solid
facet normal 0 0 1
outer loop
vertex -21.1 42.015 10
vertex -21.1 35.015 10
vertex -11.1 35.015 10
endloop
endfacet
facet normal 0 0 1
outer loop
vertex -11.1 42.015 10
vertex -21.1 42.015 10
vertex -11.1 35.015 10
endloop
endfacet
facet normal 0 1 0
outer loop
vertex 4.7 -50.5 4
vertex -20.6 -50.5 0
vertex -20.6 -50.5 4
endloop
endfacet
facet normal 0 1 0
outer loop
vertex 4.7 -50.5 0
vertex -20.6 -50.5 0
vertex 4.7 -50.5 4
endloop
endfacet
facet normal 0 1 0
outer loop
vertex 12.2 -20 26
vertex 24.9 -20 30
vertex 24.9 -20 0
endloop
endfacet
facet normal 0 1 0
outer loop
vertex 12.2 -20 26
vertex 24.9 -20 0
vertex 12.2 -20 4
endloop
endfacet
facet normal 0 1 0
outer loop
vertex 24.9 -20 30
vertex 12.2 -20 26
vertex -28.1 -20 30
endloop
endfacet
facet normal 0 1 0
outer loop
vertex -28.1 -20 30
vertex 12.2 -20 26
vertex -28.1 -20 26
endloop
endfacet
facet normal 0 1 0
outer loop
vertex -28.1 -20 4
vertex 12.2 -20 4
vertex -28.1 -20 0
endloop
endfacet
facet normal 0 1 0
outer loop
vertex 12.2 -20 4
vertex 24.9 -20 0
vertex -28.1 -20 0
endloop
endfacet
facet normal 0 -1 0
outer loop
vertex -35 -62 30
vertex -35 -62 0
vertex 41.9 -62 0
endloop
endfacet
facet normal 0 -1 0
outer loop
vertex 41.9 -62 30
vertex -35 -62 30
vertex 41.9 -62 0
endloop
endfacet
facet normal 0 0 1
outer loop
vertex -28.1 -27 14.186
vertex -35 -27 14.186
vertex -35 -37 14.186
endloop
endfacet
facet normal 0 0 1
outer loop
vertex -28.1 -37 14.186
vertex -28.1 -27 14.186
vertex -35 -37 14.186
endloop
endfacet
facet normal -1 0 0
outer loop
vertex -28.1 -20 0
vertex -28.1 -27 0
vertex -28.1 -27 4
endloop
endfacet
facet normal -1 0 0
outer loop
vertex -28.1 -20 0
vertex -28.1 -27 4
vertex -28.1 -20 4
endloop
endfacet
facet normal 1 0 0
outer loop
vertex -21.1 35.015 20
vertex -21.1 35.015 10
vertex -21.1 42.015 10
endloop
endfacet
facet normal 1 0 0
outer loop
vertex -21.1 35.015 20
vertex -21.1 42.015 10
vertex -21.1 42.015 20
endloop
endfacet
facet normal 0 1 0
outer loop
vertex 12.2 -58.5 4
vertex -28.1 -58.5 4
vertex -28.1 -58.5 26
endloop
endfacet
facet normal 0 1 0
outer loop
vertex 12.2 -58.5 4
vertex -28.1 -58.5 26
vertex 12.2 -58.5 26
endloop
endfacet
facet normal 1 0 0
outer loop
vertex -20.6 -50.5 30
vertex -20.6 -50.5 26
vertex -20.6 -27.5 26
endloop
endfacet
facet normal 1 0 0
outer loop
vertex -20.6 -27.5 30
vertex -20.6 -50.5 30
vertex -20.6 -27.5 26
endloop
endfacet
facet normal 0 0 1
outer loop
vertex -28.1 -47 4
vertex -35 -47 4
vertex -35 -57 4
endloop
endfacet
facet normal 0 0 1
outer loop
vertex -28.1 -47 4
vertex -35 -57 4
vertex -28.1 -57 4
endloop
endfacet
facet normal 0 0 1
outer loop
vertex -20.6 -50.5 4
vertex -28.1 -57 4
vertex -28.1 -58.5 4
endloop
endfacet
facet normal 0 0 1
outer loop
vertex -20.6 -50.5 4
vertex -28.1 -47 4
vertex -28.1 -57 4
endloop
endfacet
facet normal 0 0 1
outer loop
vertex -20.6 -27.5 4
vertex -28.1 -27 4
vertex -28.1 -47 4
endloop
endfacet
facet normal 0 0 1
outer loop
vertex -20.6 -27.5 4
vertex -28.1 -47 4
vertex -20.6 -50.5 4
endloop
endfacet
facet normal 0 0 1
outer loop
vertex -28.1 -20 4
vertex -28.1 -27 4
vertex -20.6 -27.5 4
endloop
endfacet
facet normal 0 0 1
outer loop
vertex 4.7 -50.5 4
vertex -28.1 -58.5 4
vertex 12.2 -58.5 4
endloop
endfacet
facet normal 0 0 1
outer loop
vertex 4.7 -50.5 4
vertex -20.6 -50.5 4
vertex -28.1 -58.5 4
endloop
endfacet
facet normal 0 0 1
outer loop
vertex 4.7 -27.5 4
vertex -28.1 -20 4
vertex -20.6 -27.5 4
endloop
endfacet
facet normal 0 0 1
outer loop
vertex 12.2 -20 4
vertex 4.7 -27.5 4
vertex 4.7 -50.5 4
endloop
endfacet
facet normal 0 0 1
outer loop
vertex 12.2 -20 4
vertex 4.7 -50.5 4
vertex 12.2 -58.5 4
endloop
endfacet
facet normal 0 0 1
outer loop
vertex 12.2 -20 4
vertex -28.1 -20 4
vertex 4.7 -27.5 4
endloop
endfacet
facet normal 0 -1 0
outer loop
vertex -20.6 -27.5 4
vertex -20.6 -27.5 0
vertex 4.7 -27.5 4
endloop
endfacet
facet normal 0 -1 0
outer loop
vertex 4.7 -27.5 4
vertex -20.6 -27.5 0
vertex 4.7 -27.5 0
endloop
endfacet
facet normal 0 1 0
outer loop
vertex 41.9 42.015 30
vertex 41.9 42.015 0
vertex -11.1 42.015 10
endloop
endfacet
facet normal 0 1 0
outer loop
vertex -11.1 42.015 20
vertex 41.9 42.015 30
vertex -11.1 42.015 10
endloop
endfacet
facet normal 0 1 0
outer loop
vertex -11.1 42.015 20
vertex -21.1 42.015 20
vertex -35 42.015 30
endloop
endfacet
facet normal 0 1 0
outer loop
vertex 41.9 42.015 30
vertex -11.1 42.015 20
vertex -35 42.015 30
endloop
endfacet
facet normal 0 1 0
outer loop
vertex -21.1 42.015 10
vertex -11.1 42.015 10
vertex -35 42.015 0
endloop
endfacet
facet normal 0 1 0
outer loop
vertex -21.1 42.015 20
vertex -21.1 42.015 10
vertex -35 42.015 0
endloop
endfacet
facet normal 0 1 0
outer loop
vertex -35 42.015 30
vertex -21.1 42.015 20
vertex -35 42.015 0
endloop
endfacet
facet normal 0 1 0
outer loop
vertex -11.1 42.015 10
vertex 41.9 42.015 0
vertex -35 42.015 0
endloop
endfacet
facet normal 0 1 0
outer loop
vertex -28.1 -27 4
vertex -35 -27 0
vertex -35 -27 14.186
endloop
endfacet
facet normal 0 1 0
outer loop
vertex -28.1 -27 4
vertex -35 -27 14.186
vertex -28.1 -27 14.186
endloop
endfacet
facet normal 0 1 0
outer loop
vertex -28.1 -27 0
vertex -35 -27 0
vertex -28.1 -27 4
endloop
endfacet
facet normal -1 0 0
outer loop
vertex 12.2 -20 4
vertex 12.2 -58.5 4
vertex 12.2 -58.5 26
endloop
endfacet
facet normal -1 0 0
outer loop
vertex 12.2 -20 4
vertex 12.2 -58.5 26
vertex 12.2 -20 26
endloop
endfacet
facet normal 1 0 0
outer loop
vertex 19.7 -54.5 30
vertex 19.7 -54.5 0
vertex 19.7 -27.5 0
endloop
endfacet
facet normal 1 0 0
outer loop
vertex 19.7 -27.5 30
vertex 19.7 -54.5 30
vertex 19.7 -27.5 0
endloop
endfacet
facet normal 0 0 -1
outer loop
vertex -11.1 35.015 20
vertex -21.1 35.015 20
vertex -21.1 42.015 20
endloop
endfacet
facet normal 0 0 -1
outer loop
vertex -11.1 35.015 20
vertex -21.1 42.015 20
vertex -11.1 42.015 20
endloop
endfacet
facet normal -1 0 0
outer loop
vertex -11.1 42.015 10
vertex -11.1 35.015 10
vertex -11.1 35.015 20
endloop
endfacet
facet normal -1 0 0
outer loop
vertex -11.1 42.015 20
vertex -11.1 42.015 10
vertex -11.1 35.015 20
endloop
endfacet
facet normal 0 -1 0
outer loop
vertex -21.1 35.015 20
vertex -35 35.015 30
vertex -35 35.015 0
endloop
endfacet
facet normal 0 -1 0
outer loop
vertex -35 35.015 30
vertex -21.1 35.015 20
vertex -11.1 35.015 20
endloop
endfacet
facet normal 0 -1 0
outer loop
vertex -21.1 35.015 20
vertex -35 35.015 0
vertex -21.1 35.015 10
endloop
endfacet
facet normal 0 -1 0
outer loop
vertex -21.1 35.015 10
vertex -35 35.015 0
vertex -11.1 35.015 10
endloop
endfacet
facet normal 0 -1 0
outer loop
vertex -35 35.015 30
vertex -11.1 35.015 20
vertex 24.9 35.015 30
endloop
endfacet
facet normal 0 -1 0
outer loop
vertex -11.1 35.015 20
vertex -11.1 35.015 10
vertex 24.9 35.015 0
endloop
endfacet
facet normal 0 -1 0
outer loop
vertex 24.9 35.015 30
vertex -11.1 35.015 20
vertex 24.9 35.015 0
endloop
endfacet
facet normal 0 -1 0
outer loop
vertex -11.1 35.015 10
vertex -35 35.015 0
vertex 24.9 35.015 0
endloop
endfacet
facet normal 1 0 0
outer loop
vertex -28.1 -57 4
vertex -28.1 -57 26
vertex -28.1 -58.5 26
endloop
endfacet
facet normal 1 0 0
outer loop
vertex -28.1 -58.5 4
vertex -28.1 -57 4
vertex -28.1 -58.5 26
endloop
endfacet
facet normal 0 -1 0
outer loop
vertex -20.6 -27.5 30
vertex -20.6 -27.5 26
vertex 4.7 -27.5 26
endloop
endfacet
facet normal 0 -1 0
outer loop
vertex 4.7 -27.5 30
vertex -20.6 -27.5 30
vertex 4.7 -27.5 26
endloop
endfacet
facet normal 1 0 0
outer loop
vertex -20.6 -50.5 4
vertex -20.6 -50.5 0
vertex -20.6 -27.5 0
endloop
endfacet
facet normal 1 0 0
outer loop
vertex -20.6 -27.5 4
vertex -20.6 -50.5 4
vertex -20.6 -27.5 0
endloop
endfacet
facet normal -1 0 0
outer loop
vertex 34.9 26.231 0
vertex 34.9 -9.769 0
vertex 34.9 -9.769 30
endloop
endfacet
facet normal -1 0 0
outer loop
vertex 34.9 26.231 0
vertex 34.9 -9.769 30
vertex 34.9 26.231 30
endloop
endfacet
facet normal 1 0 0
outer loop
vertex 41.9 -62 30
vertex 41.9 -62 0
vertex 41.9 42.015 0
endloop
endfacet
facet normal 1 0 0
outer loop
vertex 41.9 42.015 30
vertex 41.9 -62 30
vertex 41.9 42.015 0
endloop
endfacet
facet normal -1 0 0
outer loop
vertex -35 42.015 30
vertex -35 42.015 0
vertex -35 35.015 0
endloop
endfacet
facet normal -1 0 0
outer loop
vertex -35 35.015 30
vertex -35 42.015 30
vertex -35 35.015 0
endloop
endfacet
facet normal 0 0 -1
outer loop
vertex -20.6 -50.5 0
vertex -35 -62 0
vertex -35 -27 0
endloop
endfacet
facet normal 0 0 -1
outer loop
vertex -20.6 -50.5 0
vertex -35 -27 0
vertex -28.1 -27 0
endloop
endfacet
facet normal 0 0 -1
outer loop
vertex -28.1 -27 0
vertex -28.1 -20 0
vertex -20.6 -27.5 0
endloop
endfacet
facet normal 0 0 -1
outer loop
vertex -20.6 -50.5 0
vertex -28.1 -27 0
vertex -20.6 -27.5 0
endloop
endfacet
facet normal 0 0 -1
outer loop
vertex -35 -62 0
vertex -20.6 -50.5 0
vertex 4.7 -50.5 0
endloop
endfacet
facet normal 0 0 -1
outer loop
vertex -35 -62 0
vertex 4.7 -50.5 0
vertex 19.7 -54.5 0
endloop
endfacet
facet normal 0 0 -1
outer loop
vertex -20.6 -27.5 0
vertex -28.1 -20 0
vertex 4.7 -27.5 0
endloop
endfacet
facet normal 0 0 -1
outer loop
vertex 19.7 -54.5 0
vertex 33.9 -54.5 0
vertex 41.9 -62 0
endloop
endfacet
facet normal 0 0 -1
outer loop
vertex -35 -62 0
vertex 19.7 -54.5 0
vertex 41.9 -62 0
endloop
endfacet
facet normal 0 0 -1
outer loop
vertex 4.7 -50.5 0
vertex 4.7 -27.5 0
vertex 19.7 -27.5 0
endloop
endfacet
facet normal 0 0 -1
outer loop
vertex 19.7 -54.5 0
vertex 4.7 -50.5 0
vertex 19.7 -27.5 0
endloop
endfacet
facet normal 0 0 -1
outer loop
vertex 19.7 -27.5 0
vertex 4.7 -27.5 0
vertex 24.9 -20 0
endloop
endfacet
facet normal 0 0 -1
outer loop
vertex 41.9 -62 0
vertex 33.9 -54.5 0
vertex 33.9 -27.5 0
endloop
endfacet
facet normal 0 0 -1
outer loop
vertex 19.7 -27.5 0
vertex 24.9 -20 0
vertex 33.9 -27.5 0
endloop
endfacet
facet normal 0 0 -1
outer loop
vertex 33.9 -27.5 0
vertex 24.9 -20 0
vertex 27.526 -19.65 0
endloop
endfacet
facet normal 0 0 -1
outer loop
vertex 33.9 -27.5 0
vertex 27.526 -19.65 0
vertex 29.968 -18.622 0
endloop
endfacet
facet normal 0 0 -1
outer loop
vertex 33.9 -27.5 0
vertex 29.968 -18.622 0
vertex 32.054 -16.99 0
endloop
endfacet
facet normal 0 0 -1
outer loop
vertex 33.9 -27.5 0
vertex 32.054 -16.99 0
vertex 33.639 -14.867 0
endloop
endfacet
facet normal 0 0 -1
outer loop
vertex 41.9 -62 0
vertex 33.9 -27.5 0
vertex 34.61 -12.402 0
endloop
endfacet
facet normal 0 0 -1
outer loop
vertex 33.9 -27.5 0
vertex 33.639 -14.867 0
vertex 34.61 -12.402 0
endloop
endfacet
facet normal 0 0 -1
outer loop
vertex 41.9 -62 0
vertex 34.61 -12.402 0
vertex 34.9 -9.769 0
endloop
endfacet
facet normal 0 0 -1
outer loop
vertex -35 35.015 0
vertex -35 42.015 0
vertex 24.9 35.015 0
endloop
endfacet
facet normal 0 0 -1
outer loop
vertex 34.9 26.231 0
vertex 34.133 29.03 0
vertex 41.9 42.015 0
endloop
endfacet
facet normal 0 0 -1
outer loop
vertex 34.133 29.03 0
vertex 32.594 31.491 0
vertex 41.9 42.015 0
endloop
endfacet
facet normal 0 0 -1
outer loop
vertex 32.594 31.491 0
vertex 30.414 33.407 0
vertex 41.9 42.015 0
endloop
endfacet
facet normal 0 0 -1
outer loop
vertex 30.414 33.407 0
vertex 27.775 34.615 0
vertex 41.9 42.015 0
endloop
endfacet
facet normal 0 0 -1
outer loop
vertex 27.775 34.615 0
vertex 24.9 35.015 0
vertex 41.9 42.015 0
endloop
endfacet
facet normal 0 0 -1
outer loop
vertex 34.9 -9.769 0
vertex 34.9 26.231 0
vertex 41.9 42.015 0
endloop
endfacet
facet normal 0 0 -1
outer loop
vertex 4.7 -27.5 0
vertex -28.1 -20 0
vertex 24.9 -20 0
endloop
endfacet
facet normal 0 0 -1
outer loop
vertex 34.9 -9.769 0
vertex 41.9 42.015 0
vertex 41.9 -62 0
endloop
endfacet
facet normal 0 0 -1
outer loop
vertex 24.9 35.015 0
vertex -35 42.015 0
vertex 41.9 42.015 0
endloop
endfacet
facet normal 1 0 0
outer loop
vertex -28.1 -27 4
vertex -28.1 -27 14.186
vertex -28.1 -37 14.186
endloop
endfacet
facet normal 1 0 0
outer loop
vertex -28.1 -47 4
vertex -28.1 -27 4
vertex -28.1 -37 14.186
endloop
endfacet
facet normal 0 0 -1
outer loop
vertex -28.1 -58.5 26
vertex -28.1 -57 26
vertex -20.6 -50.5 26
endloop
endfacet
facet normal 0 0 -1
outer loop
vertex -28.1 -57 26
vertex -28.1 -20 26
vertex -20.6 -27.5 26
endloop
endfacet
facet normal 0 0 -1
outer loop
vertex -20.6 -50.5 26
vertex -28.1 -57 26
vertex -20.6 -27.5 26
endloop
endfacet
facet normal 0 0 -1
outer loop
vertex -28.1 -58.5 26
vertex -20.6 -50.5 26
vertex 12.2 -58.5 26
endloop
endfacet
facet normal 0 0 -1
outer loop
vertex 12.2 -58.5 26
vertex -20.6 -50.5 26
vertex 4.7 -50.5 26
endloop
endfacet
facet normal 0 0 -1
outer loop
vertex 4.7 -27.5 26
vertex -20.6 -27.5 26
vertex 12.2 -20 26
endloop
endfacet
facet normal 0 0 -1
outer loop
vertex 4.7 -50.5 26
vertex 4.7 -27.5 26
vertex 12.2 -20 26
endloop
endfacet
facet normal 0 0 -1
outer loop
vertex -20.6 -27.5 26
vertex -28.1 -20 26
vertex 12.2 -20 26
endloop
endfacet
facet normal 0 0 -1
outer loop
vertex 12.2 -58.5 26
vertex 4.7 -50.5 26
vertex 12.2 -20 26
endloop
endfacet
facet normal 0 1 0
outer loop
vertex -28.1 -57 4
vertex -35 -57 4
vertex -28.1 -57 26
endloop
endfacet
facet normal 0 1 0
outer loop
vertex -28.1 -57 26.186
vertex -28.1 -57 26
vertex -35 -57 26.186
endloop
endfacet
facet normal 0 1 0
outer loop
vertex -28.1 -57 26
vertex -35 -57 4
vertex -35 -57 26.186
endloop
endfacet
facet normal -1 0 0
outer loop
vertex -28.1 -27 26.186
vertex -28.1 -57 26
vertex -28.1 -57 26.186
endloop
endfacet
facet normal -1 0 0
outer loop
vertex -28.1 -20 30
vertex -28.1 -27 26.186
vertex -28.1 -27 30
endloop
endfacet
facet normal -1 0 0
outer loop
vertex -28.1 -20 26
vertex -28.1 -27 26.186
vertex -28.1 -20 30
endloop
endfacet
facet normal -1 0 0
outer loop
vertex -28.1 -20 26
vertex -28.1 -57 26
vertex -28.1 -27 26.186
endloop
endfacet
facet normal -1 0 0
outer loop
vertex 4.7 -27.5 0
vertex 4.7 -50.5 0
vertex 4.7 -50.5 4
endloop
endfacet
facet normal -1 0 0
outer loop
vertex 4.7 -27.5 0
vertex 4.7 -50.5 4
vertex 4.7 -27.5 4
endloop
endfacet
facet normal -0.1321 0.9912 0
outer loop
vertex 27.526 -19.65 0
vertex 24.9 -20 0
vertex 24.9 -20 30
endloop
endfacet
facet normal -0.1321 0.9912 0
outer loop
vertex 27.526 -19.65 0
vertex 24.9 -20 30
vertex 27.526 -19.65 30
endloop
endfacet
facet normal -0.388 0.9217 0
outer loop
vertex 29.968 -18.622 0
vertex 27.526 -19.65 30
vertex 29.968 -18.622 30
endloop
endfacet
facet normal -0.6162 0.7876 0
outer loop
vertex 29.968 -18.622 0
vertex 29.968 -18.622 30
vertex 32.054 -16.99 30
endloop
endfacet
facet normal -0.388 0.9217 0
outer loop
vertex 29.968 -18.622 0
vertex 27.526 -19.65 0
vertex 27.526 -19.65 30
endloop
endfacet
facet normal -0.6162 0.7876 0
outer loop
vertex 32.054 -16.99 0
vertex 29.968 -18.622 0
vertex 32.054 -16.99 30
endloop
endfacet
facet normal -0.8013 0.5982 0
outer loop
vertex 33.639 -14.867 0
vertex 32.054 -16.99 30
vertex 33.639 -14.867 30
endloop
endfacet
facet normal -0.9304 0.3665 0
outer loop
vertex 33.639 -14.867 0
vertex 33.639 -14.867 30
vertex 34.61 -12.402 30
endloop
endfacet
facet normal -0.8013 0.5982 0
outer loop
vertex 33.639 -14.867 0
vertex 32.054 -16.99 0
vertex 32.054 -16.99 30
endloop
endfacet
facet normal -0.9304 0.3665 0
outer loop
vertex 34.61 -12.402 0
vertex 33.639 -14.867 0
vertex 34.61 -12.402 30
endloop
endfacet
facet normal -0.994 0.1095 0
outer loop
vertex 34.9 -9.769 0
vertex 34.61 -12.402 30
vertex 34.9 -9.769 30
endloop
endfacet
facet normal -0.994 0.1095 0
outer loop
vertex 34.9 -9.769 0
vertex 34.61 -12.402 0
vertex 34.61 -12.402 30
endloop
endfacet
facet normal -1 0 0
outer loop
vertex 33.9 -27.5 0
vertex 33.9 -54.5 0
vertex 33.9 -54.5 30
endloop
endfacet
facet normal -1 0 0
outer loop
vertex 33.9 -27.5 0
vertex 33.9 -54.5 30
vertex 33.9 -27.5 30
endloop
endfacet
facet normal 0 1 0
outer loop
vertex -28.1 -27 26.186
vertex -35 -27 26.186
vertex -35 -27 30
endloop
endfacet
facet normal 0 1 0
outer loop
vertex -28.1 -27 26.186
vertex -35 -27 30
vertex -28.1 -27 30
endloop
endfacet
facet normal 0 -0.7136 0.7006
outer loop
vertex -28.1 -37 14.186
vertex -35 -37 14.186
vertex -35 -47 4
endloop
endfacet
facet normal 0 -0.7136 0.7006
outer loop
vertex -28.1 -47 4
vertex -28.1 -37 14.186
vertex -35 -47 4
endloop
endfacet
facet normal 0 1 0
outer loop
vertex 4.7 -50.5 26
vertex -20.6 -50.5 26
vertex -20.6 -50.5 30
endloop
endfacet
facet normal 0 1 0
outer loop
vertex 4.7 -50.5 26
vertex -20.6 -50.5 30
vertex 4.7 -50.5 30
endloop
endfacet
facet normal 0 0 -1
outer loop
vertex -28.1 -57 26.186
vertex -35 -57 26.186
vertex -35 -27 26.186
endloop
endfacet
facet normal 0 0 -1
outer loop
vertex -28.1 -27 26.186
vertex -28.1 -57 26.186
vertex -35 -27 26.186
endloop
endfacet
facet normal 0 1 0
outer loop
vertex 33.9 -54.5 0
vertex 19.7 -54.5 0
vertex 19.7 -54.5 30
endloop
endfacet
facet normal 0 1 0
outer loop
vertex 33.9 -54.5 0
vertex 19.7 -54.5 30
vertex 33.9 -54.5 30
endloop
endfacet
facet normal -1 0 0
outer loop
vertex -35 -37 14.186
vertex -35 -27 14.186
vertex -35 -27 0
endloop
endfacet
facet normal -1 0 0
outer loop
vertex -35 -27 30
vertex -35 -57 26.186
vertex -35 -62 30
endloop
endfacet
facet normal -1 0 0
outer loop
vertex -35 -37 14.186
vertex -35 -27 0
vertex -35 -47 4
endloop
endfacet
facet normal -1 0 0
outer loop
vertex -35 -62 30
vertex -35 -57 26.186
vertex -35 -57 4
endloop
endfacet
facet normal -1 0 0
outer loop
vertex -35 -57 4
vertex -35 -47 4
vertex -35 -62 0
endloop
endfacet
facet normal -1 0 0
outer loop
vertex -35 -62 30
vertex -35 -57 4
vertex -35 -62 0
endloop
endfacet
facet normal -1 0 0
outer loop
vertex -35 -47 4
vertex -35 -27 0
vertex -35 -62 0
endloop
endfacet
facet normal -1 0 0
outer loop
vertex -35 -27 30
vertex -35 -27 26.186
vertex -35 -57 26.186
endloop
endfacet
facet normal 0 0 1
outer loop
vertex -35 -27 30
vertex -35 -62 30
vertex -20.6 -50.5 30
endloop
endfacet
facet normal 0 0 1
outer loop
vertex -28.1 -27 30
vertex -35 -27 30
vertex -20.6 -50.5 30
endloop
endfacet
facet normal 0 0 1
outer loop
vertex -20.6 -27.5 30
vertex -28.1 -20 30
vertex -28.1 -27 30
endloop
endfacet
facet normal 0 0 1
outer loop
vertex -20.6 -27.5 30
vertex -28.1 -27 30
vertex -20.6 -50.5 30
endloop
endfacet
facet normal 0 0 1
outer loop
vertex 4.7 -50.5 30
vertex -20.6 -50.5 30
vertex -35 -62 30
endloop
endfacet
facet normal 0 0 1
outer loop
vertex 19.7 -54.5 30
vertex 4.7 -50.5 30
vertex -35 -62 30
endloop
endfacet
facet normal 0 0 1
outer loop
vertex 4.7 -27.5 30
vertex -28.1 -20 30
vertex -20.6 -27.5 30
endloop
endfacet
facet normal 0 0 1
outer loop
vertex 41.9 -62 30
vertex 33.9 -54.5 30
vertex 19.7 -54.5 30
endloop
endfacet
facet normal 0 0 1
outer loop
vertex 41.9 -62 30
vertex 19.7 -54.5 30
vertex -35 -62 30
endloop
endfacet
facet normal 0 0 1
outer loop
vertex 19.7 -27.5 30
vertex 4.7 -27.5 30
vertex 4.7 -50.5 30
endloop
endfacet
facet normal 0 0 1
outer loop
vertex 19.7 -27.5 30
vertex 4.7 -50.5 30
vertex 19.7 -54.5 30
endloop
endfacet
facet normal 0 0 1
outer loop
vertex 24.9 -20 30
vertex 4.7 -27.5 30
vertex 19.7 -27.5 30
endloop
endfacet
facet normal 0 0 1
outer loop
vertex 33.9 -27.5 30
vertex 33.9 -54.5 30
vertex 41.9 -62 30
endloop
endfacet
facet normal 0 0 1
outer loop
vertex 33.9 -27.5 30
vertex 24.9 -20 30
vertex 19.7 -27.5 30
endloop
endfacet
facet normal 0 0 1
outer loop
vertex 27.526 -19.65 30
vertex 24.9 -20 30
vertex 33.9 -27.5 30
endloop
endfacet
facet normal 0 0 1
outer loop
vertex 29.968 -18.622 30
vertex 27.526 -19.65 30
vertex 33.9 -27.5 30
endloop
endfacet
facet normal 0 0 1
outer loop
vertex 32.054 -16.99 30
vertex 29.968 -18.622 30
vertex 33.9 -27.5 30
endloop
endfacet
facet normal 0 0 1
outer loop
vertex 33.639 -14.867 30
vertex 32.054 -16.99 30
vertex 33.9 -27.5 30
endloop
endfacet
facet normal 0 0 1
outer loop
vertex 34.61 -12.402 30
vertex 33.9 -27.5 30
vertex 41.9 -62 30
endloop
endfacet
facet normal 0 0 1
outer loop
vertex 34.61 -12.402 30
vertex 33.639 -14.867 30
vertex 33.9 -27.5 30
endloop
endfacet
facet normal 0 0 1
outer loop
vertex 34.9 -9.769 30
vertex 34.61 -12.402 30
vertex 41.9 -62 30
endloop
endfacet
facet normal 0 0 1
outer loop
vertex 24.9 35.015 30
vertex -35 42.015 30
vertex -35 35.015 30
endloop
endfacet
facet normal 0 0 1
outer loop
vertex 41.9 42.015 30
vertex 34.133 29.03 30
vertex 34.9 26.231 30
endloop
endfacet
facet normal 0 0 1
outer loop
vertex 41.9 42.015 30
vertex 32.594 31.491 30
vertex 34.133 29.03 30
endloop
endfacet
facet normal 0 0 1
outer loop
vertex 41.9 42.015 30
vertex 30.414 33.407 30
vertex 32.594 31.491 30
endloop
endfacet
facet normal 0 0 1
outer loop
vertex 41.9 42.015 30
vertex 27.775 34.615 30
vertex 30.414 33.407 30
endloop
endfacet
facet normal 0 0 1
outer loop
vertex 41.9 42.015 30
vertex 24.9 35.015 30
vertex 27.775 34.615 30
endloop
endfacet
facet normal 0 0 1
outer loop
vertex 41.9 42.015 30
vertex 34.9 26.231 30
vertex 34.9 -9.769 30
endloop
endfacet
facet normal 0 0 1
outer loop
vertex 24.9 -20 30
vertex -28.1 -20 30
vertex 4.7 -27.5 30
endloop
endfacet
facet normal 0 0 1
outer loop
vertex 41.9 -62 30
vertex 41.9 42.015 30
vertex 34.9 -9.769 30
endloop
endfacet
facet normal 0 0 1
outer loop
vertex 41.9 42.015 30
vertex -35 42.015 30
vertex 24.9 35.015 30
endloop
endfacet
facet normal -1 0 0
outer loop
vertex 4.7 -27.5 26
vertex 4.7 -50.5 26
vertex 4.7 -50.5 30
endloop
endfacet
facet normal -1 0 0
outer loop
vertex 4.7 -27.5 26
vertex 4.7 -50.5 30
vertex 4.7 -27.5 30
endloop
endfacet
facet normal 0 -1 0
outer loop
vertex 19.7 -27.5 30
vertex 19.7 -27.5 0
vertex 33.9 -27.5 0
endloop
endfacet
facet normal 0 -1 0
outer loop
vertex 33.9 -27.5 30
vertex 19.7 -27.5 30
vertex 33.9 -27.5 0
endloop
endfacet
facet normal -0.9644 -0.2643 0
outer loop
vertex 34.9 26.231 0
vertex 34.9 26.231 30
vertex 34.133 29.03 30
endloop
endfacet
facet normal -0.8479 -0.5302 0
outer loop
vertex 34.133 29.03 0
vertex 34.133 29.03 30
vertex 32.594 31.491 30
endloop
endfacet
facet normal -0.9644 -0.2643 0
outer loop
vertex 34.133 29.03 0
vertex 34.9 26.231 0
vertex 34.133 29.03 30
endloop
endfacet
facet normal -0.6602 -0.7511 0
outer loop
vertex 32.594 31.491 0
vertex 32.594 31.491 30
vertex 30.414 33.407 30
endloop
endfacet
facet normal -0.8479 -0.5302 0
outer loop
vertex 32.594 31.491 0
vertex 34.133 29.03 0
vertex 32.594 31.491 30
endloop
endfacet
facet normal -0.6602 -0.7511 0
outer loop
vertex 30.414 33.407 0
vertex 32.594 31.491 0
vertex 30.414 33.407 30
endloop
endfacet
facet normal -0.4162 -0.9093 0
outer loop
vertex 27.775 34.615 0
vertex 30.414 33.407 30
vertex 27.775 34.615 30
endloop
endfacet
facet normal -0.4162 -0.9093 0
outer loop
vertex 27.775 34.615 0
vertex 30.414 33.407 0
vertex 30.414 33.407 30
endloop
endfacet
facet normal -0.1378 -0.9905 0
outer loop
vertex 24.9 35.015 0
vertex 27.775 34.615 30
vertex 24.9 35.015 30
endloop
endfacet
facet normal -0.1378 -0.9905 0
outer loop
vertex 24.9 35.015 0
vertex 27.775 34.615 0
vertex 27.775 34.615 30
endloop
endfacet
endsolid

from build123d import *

# Parameters (mm, degrees)
PAD_DEPTH       = 30
POCKET_DEPTH    = 22
POCKET001_DEPTH = 6.9
SKETCH003_W     = 25.3
SKETCH003_H     = 23
SKETCH003_W_2   = 14.2
SKETCH003_H_2   = 27
POCKET002_DEPTH = 30
SKETCH004_W     = 10
SKETCH004_H     = 10
POCKET003_DEPTH = 50


with BuildPart() as part:
    # Sketch → Pad (new body)
    with BuildSketch(Plane.XY):
        with BuildLine():
            Line((-35, 42.015359), (-35, 35.015359))
            Line((-35, 35.015359), (24.9, 35.015359))
            ThreePointArc((34.9, 26.231153), (31.573738, 32.528651), (24.9, 35.015359))
            Line((34.9, -9.768847), (34.9, 26.231153))
            ThreePointArc((24.9, -20), (32.054064, -16.989821), (34.9, -9.768847))
            Line((24.9, -20), (-28.1, -20))
            Line((-28.1, -27), (-28.1, -20))
            Line((-35, -27), (-28.1, -27))
            Line((-35, -27), (-35, -62))
            Line((-35, -62), (41.9, -62))
            Line((41.9, -62), (41.9, 42.015359))
            Line((41.9, 42.015359), (-35, 42.015359))
        make_face()
    extrude(amount=PAD_DEPTH)

    # Sketch001 → Pocket (cut)
    with BuildSketch(Plane.XY.offset(4)):
        Polygon((-28.1, -20), (-28.1, -58.5), (12.2, -58.5), (12.2, -20), (-18.1, -20), (-18.1, -13.5), (-24.1, -13.5), (-24.1, -20), align=None)
    extrude(amount=POCKET_DEPTH, mode=Mode.SUBTRACT)

    # Sketch002 → Pocket001 (cut)
    with BuildSketch(Plane.YZ.offset(-35)):
        Polygon((-27, 26.185834), (-27, 14.185834), (-37, 14.185834), (-47, 4), (-57, 4), (-57, 26.185834), align=None)
    extrude(amount=POCKET001_DEPTH, mode=Mode.SUBTRACT)

    # Sketch003 → Pocket002 (cut)
    with BuildSketch(Plane.XY):
        with Locations((-7.95, -39)):
            Rectangle(SKETCH003_W, SKETCH003_H)
        with Locations((26.8, -41)):
            Rectangle(SKETCH003_W_2, SKETCH003_H_2)
    extrude(amount=POCKET002_DEPTH, mode=Mode.SUBTRACT)

    # Sketch004 → Pocket003 (cut)
    with BuildSketch(Plane.XZ):
        with Locations((-16.1, 15)):
            Rectangle(SKETCH004_W, SKETCH004_H)
    extrude(amount=-POCKET003_DEPTH, mode=Mode.SUBTRACT)


solid = part.part
